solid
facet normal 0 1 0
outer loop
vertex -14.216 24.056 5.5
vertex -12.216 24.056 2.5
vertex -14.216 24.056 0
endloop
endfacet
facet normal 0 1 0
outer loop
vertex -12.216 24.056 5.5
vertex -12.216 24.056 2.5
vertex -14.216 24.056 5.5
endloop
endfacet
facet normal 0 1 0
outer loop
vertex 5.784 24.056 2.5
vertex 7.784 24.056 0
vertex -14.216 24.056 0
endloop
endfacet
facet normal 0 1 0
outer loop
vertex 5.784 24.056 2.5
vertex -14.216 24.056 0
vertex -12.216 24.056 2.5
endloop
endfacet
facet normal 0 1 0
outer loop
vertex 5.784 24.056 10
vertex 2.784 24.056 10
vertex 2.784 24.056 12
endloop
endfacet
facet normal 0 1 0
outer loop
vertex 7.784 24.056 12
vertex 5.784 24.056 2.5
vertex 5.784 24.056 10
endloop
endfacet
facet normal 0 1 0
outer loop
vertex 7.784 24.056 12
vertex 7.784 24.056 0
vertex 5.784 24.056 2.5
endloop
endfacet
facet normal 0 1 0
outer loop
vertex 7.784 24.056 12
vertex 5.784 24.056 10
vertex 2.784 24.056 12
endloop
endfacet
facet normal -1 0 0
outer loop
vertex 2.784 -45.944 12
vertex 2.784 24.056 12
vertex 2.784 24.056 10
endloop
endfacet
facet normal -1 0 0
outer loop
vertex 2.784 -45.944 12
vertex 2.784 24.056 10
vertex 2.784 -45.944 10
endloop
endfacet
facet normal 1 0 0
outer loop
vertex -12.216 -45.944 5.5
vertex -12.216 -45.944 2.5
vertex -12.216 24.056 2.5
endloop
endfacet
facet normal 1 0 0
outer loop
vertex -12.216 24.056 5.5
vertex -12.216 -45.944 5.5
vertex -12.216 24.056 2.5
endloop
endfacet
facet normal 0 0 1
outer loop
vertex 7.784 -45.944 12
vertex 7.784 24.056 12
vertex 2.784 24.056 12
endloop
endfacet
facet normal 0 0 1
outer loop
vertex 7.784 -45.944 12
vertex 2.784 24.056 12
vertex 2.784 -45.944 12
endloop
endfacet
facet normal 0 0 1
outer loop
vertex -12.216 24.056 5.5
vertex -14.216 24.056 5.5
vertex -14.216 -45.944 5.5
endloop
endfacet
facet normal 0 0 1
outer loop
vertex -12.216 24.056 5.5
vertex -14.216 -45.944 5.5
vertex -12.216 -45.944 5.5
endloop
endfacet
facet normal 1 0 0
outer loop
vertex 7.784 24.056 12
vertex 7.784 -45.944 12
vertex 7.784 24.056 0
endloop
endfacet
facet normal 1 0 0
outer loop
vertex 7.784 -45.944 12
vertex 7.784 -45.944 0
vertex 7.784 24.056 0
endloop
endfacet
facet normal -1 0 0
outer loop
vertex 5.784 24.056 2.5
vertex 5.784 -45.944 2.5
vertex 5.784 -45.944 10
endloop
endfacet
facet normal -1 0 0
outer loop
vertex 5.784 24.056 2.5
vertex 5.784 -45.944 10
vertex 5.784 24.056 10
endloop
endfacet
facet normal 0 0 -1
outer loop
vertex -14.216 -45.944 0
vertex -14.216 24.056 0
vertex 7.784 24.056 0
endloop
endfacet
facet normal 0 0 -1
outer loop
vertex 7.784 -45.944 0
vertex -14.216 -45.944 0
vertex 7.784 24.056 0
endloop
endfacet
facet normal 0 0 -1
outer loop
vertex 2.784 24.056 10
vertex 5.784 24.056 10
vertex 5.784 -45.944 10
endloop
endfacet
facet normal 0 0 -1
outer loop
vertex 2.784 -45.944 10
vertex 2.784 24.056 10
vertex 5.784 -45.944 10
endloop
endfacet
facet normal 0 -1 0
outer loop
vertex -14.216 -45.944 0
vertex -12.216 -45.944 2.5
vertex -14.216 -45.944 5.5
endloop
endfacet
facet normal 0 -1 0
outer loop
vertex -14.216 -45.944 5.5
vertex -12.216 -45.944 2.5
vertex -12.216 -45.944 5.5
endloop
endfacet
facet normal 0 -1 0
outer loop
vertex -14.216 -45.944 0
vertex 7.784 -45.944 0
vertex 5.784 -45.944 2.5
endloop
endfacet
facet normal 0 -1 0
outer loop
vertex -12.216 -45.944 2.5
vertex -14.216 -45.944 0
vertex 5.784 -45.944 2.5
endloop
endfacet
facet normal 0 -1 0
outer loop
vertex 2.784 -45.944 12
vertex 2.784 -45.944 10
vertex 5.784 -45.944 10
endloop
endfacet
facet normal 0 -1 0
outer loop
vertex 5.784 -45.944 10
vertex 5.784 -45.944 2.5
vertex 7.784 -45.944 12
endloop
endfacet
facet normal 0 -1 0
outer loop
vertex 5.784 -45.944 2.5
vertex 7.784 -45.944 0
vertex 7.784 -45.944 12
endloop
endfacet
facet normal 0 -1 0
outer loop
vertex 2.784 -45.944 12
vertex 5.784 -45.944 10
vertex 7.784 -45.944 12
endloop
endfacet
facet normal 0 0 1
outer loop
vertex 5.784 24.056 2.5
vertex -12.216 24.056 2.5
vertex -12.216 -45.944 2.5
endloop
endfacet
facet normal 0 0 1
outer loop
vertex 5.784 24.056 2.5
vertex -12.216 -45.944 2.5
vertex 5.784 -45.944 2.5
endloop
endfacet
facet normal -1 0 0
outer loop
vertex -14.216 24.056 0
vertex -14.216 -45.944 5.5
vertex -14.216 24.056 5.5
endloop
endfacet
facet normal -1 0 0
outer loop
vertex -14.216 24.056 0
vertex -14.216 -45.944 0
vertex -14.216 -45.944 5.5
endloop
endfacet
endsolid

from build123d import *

# Parameters (mm, degrees)
F0_W     = 22
F0_H     = 70
F1_DEPTH = 2.5
F2_W     = 2
F2_H     = 70
F3_DEPTH = 3
F4_DEPTH = 9.5
F5_W     = 70
F5_H     = 2
F6_DEPTH = 3


with BuildPart() as f1:
    # F0 (on Top) → F1 (new body)
    with BuildSketch(Plane.XY):
        with Locations((-3.216149, -10.944109)):
            Rectangle(F0_W, F0_H)
    extrude(amount=F1_DEPTH)

    # F2 (on face) → F3 (join)
    with BuildSketch(Plane.XY.offset(2.5)):
        with Locations((-13.216149, -10.944109)):
            Rectangle(F2_W, F2_H)
    extrude(amount=F3_DEPTH)

    # F2 (on face) → F4 (join)
    with BuildSketch(Plane.XY.offset(2.5)):
        with Locations((6.783851, -10.944109)):
            Rectangle(F2_W, F2_H)
    extrude(amount=F4_DEPTH)

    # F5 (on face) → F6 (join)
    with BuildSketch(Plane(origin=(5.783851, 0, 0), x_dir=(0, -1, 0), z_dir=(-1, 0, 0))):
        with Locations((10.944109, 11)):
            Rectangle(F5_W, F5_H)
    extrude(amount=F6_DEPTH)


solid = f1.part
